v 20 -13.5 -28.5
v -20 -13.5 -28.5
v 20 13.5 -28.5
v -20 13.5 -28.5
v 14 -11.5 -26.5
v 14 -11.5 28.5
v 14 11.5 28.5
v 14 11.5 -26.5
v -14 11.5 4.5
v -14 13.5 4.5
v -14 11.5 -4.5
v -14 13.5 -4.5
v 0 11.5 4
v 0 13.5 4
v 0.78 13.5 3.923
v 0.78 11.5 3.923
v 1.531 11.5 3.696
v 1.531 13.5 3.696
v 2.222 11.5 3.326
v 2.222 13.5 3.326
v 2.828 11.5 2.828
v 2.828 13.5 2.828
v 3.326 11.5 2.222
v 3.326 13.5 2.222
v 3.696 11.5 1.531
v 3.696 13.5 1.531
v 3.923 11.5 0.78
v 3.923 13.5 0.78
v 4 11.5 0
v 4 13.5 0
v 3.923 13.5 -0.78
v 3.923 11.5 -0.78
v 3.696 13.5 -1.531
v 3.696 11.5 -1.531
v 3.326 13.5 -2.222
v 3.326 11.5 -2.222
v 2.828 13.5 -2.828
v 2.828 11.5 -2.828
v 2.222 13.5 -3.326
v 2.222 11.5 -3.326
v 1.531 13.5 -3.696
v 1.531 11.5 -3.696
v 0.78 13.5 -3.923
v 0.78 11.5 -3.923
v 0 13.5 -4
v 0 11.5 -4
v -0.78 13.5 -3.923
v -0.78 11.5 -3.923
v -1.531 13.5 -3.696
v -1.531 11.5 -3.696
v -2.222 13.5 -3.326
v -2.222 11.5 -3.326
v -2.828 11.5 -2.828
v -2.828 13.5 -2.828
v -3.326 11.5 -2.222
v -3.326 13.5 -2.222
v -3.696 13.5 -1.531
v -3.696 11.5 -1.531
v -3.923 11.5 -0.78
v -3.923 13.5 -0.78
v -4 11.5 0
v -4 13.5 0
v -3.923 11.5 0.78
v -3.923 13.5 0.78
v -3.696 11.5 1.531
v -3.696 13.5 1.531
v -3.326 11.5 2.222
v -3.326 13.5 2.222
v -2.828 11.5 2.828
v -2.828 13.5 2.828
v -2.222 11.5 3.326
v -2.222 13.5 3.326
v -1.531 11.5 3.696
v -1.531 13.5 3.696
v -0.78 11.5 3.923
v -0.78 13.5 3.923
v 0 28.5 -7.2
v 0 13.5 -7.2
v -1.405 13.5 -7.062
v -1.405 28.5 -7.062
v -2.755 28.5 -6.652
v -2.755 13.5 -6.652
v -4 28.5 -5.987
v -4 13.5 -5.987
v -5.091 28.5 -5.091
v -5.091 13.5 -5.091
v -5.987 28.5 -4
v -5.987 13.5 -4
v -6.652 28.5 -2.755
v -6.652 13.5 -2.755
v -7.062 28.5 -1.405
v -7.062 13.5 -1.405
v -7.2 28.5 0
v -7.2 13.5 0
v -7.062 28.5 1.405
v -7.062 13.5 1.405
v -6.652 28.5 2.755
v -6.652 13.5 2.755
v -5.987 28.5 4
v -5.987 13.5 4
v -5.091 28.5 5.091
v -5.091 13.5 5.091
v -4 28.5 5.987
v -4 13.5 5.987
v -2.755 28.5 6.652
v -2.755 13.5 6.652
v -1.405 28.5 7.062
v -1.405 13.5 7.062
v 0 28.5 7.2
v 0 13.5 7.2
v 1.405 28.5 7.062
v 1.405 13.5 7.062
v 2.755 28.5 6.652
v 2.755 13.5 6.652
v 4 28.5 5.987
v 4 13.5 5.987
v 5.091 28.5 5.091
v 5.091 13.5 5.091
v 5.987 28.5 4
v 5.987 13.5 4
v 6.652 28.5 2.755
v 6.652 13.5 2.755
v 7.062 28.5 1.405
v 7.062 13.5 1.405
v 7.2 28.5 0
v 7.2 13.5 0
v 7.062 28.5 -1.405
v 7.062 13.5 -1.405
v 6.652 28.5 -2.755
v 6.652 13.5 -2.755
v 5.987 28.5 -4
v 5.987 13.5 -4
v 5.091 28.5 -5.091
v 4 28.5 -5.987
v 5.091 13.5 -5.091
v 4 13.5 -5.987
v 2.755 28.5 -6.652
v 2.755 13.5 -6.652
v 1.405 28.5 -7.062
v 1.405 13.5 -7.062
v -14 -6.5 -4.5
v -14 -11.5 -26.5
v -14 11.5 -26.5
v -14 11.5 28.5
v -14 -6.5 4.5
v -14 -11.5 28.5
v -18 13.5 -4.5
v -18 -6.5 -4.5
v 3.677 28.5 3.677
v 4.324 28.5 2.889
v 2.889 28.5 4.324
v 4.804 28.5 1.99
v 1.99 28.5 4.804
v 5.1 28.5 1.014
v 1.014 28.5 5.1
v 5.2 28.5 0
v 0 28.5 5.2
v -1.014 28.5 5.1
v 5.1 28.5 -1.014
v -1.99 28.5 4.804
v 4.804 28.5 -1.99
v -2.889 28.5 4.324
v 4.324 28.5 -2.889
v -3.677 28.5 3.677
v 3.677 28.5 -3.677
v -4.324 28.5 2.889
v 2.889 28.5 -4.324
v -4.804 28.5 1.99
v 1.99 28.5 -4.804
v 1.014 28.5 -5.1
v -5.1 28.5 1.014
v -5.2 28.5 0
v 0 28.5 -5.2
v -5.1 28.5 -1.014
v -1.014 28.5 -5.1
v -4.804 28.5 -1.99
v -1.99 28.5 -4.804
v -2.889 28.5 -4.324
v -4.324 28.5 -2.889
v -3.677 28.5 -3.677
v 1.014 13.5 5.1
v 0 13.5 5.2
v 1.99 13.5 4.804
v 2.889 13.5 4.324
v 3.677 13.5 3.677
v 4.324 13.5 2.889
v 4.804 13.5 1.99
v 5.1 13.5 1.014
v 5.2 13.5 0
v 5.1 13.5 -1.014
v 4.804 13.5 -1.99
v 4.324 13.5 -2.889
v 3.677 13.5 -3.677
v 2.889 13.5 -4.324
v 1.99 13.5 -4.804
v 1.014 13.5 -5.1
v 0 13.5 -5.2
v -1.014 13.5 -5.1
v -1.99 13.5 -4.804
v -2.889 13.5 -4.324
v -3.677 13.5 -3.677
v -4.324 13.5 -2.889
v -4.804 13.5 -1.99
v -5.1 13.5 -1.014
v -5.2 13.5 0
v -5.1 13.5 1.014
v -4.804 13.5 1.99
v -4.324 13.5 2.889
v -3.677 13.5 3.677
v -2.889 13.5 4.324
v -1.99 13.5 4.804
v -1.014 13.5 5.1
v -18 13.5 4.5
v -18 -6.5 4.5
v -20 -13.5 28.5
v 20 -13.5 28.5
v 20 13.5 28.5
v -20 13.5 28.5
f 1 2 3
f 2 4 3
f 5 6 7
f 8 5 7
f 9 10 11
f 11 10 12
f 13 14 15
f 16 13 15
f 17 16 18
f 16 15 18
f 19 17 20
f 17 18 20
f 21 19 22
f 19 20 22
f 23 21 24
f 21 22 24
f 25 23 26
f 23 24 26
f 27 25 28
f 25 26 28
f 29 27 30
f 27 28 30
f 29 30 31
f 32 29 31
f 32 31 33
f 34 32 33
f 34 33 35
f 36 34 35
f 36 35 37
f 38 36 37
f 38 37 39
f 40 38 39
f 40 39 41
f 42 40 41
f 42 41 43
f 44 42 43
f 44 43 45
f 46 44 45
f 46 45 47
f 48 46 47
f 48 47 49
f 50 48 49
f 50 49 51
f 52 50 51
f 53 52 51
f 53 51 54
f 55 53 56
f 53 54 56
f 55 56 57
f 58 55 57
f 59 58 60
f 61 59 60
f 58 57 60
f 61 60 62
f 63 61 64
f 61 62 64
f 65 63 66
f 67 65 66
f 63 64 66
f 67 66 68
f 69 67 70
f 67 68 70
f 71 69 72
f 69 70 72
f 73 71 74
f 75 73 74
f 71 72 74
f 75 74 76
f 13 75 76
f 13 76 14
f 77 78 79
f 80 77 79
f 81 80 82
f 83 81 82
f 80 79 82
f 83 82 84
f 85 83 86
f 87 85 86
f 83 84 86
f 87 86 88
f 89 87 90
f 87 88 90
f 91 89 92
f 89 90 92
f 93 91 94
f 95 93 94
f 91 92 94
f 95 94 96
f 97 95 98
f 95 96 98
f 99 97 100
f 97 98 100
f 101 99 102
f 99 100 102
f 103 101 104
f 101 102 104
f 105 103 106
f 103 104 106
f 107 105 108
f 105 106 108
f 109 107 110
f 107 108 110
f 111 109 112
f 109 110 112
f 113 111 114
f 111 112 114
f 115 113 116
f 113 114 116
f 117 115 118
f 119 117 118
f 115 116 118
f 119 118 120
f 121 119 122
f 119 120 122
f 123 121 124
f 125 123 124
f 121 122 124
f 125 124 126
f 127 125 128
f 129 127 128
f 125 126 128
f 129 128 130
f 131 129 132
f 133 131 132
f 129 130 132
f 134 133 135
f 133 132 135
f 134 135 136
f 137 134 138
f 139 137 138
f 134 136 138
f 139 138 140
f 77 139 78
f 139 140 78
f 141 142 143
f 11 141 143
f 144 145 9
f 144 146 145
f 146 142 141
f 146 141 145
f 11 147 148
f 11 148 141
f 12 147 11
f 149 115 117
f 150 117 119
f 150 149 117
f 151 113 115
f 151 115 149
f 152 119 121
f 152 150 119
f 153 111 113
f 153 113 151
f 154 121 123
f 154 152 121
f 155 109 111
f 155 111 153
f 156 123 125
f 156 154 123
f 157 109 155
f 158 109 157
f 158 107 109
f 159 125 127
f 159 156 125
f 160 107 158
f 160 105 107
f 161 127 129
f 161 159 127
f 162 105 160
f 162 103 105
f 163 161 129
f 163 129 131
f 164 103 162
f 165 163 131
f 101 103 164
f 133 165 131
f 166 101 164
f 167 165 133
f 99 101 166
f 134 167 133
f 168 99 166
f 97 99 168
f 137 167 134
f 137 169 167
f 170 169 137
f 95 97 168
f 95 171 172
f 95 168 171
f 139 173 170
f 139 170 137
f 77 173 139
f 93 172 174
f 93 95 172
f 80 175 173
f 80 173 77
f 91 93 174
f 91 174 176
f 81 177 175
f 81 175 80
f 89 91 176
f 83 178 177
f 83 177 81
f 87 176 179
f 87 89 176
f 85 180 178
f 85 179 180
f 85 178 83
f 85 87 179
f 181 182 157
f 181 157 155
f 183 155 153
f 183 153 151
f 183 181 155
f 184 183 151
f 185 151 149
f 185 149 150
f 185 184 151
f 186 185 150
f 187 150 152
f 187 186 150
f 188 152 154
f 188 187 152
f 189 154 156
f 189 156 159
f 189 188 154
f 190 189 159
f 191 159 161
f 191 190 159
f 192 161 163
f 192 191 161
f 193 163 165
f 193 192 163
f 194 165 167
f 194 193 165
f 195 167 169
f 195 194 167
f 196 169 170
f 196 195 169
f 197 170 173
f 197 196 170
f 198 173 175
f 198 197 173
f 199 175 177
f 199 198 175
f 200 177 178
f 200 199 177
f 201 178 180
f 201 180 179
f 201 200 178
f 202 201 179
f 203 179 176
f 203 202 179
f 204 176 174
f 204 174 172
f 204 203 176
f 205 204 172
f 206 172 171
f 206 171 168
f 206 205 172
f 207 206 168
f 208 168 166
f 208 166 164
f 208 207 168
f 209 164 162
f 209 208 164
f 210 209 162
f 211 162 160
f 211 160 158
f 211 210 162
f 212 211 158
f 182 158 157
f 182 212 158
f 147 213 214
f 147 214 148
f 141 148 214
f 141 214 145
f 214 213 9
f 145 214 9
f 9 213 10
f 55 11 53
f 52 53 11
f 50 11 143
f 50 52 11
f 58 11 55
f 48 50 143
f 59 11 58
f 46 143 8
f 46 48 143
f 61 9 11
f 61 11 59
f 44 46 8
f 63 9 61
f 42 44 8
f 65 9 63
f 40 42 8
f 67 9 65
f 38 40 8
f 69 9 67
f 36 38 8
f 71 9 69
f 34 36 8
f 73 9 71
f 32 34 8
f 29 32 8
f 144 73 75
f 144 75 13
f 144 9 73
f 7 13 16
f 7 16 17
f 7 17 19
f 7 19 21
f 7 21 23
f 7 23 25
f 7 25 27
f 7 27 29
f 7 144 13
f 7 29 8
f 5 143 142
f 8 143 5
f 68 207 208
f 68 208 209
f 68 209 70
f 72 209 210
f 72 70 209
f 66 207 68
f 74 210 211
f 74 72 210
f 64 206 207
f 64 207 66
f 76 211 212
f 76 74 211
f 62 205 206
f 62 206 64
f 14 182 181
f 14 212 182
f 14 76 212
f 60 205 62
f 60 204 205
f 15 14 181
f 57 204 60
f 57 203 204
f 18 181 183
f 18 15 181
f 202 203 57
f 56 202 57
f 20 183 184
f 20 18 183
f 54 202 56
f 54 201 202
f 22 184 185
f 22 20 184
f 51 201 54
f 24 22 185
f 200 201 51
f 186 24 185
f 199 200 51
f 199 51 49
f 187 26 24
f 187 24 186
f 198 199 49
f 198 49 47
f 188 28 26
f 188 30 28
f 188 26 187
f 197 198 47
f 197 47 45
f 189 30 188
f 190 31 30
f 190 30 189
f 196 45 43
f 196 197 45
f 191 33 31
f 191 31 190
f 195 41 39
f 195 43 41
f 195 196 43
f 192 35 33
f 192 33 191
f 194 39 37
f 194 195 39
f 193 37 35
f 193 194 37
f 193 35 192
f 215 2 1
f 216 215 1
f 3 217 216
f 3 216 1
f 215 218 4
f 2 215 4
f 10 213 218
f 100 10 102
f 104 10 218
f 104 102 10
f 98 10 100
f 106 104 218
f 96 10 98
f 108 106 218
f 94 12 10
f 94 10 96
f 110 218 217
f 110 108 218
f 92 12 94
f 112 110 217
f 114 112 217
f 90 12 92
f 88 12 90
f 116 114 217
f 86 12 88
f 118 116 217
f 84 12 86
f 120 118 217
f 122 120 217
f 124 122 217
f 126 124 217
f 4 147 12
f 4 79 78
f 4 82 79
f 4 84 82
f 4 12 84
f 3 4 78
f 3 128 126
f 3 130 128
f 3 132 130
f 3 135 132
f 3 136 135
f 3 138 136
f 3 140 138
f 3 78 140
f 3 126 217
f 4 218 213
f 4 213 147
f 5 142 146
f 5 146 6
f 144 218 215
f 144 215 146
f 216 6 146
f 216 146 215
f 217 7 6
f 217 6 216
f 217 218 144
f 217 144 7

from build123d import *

# Parameters (mm, degrees)
ESQUISSE1_W             = 40
ESQUISSE1_H             = 57
BOSS_EXTRU_1_DEPTH      = 13.5
ESQUISSE5_W             = 28
ESQUISSE5_H             = 23
ENL_V_MAT_EXTRU_1_DEPTH = 55
ENL_V_MAT_EXTRU_2_REACH = 46.06
ESQUISSE6_R             = 4
ESQUISSE6_3_R           = 7.2
ESQUISSE6_3_R_2         = 5.2
BOSS_EXTRU_2_DEPTH      = 15
ESQUISSE7_W             = 4
ESQUISSE7_H             = 9
ENL_V_MAT_EXTRU_3_DEPTH = 20


with BuildPart() as part:
    # Esquisse1 → Boss.-Extru.1 (new, symmetric)
    with BuildSketch(Plane(origin=(0, 0, 0), x_dir=(1, 0, 0), z_dir=(0, 1, 0))):
        Rectangle(ESQUISSE1_W, ESQUISSE1_H)
    extrude(amount=BOSS_EXTRU_1_DEPTH, both=True)

    # Esquisse5 → Enlèv. mat.-Extru.1 (cut)
    with BuildSketch(Plane.XY.offset(28.5)):
        Rectangle(ESQUISSE5_W, ESQUISSE5_H)
    extrude(amount=-ENL_V_MAT_EXTRU_1_DEPTH, mode=Mode.SUBTRACT)

    # Esquisse6 → Enlèv. mat.-Extru.2 (cut, up to next)
    with BuildSketch(Plane(origin=(0, 13.5, 0), x_dir=(1, 0, 0), z_dir=(0, 1, 0)), mode=Mode.PRIVATE) as enl_v_mat_extru_2_sk1:
        Circle(ESQUISSE6_R)
    enl_v_mat_extru_2_tool1 = extrude(enl_v_mat_extru_2_sk1.sketch, amount=-ENL_V_MAT_EXTRU_2_REACH, mode=Mode.PRIVATE) & part.part
    add(enl_v_mat_extru_2_tool1.solids().sort_by_distance((0, 13.5, 0))[0], mode=Mode.SUBTRACT)

    # Esquisse6<3> → Boss.-Extru.2 (add)
    with BuildSketch(Plane(origin=(0, 13.5, 0), x_dir=(1, 0, 0), z_dir=(0, 1, 0))):
        Circle(ESQUISSE6_3_R)
        Circle(ESQUISSE6_3_R_2, mode=Mode.SUBTRACT)
    extrude(amount=BOSS_EXTRU_2_DEPTH)

    # Esquisse7 → Enlèv. mat.-Extru.3 (cut)
    with BuildSketch(Plane(origin=(0, 13.5, 0), x_dir=(1, 0, 0), z_dir=(0, 1, 0))):
        with Locations((-16, 0)):
            Rectangle(ESQUISSE7_W, ESQUISSE7_H)
    extrude(amount=-ENL_V_MAT_EXTRU_3_DEPTH, mode=Mode.SUBTRACT)


solid = part.part
